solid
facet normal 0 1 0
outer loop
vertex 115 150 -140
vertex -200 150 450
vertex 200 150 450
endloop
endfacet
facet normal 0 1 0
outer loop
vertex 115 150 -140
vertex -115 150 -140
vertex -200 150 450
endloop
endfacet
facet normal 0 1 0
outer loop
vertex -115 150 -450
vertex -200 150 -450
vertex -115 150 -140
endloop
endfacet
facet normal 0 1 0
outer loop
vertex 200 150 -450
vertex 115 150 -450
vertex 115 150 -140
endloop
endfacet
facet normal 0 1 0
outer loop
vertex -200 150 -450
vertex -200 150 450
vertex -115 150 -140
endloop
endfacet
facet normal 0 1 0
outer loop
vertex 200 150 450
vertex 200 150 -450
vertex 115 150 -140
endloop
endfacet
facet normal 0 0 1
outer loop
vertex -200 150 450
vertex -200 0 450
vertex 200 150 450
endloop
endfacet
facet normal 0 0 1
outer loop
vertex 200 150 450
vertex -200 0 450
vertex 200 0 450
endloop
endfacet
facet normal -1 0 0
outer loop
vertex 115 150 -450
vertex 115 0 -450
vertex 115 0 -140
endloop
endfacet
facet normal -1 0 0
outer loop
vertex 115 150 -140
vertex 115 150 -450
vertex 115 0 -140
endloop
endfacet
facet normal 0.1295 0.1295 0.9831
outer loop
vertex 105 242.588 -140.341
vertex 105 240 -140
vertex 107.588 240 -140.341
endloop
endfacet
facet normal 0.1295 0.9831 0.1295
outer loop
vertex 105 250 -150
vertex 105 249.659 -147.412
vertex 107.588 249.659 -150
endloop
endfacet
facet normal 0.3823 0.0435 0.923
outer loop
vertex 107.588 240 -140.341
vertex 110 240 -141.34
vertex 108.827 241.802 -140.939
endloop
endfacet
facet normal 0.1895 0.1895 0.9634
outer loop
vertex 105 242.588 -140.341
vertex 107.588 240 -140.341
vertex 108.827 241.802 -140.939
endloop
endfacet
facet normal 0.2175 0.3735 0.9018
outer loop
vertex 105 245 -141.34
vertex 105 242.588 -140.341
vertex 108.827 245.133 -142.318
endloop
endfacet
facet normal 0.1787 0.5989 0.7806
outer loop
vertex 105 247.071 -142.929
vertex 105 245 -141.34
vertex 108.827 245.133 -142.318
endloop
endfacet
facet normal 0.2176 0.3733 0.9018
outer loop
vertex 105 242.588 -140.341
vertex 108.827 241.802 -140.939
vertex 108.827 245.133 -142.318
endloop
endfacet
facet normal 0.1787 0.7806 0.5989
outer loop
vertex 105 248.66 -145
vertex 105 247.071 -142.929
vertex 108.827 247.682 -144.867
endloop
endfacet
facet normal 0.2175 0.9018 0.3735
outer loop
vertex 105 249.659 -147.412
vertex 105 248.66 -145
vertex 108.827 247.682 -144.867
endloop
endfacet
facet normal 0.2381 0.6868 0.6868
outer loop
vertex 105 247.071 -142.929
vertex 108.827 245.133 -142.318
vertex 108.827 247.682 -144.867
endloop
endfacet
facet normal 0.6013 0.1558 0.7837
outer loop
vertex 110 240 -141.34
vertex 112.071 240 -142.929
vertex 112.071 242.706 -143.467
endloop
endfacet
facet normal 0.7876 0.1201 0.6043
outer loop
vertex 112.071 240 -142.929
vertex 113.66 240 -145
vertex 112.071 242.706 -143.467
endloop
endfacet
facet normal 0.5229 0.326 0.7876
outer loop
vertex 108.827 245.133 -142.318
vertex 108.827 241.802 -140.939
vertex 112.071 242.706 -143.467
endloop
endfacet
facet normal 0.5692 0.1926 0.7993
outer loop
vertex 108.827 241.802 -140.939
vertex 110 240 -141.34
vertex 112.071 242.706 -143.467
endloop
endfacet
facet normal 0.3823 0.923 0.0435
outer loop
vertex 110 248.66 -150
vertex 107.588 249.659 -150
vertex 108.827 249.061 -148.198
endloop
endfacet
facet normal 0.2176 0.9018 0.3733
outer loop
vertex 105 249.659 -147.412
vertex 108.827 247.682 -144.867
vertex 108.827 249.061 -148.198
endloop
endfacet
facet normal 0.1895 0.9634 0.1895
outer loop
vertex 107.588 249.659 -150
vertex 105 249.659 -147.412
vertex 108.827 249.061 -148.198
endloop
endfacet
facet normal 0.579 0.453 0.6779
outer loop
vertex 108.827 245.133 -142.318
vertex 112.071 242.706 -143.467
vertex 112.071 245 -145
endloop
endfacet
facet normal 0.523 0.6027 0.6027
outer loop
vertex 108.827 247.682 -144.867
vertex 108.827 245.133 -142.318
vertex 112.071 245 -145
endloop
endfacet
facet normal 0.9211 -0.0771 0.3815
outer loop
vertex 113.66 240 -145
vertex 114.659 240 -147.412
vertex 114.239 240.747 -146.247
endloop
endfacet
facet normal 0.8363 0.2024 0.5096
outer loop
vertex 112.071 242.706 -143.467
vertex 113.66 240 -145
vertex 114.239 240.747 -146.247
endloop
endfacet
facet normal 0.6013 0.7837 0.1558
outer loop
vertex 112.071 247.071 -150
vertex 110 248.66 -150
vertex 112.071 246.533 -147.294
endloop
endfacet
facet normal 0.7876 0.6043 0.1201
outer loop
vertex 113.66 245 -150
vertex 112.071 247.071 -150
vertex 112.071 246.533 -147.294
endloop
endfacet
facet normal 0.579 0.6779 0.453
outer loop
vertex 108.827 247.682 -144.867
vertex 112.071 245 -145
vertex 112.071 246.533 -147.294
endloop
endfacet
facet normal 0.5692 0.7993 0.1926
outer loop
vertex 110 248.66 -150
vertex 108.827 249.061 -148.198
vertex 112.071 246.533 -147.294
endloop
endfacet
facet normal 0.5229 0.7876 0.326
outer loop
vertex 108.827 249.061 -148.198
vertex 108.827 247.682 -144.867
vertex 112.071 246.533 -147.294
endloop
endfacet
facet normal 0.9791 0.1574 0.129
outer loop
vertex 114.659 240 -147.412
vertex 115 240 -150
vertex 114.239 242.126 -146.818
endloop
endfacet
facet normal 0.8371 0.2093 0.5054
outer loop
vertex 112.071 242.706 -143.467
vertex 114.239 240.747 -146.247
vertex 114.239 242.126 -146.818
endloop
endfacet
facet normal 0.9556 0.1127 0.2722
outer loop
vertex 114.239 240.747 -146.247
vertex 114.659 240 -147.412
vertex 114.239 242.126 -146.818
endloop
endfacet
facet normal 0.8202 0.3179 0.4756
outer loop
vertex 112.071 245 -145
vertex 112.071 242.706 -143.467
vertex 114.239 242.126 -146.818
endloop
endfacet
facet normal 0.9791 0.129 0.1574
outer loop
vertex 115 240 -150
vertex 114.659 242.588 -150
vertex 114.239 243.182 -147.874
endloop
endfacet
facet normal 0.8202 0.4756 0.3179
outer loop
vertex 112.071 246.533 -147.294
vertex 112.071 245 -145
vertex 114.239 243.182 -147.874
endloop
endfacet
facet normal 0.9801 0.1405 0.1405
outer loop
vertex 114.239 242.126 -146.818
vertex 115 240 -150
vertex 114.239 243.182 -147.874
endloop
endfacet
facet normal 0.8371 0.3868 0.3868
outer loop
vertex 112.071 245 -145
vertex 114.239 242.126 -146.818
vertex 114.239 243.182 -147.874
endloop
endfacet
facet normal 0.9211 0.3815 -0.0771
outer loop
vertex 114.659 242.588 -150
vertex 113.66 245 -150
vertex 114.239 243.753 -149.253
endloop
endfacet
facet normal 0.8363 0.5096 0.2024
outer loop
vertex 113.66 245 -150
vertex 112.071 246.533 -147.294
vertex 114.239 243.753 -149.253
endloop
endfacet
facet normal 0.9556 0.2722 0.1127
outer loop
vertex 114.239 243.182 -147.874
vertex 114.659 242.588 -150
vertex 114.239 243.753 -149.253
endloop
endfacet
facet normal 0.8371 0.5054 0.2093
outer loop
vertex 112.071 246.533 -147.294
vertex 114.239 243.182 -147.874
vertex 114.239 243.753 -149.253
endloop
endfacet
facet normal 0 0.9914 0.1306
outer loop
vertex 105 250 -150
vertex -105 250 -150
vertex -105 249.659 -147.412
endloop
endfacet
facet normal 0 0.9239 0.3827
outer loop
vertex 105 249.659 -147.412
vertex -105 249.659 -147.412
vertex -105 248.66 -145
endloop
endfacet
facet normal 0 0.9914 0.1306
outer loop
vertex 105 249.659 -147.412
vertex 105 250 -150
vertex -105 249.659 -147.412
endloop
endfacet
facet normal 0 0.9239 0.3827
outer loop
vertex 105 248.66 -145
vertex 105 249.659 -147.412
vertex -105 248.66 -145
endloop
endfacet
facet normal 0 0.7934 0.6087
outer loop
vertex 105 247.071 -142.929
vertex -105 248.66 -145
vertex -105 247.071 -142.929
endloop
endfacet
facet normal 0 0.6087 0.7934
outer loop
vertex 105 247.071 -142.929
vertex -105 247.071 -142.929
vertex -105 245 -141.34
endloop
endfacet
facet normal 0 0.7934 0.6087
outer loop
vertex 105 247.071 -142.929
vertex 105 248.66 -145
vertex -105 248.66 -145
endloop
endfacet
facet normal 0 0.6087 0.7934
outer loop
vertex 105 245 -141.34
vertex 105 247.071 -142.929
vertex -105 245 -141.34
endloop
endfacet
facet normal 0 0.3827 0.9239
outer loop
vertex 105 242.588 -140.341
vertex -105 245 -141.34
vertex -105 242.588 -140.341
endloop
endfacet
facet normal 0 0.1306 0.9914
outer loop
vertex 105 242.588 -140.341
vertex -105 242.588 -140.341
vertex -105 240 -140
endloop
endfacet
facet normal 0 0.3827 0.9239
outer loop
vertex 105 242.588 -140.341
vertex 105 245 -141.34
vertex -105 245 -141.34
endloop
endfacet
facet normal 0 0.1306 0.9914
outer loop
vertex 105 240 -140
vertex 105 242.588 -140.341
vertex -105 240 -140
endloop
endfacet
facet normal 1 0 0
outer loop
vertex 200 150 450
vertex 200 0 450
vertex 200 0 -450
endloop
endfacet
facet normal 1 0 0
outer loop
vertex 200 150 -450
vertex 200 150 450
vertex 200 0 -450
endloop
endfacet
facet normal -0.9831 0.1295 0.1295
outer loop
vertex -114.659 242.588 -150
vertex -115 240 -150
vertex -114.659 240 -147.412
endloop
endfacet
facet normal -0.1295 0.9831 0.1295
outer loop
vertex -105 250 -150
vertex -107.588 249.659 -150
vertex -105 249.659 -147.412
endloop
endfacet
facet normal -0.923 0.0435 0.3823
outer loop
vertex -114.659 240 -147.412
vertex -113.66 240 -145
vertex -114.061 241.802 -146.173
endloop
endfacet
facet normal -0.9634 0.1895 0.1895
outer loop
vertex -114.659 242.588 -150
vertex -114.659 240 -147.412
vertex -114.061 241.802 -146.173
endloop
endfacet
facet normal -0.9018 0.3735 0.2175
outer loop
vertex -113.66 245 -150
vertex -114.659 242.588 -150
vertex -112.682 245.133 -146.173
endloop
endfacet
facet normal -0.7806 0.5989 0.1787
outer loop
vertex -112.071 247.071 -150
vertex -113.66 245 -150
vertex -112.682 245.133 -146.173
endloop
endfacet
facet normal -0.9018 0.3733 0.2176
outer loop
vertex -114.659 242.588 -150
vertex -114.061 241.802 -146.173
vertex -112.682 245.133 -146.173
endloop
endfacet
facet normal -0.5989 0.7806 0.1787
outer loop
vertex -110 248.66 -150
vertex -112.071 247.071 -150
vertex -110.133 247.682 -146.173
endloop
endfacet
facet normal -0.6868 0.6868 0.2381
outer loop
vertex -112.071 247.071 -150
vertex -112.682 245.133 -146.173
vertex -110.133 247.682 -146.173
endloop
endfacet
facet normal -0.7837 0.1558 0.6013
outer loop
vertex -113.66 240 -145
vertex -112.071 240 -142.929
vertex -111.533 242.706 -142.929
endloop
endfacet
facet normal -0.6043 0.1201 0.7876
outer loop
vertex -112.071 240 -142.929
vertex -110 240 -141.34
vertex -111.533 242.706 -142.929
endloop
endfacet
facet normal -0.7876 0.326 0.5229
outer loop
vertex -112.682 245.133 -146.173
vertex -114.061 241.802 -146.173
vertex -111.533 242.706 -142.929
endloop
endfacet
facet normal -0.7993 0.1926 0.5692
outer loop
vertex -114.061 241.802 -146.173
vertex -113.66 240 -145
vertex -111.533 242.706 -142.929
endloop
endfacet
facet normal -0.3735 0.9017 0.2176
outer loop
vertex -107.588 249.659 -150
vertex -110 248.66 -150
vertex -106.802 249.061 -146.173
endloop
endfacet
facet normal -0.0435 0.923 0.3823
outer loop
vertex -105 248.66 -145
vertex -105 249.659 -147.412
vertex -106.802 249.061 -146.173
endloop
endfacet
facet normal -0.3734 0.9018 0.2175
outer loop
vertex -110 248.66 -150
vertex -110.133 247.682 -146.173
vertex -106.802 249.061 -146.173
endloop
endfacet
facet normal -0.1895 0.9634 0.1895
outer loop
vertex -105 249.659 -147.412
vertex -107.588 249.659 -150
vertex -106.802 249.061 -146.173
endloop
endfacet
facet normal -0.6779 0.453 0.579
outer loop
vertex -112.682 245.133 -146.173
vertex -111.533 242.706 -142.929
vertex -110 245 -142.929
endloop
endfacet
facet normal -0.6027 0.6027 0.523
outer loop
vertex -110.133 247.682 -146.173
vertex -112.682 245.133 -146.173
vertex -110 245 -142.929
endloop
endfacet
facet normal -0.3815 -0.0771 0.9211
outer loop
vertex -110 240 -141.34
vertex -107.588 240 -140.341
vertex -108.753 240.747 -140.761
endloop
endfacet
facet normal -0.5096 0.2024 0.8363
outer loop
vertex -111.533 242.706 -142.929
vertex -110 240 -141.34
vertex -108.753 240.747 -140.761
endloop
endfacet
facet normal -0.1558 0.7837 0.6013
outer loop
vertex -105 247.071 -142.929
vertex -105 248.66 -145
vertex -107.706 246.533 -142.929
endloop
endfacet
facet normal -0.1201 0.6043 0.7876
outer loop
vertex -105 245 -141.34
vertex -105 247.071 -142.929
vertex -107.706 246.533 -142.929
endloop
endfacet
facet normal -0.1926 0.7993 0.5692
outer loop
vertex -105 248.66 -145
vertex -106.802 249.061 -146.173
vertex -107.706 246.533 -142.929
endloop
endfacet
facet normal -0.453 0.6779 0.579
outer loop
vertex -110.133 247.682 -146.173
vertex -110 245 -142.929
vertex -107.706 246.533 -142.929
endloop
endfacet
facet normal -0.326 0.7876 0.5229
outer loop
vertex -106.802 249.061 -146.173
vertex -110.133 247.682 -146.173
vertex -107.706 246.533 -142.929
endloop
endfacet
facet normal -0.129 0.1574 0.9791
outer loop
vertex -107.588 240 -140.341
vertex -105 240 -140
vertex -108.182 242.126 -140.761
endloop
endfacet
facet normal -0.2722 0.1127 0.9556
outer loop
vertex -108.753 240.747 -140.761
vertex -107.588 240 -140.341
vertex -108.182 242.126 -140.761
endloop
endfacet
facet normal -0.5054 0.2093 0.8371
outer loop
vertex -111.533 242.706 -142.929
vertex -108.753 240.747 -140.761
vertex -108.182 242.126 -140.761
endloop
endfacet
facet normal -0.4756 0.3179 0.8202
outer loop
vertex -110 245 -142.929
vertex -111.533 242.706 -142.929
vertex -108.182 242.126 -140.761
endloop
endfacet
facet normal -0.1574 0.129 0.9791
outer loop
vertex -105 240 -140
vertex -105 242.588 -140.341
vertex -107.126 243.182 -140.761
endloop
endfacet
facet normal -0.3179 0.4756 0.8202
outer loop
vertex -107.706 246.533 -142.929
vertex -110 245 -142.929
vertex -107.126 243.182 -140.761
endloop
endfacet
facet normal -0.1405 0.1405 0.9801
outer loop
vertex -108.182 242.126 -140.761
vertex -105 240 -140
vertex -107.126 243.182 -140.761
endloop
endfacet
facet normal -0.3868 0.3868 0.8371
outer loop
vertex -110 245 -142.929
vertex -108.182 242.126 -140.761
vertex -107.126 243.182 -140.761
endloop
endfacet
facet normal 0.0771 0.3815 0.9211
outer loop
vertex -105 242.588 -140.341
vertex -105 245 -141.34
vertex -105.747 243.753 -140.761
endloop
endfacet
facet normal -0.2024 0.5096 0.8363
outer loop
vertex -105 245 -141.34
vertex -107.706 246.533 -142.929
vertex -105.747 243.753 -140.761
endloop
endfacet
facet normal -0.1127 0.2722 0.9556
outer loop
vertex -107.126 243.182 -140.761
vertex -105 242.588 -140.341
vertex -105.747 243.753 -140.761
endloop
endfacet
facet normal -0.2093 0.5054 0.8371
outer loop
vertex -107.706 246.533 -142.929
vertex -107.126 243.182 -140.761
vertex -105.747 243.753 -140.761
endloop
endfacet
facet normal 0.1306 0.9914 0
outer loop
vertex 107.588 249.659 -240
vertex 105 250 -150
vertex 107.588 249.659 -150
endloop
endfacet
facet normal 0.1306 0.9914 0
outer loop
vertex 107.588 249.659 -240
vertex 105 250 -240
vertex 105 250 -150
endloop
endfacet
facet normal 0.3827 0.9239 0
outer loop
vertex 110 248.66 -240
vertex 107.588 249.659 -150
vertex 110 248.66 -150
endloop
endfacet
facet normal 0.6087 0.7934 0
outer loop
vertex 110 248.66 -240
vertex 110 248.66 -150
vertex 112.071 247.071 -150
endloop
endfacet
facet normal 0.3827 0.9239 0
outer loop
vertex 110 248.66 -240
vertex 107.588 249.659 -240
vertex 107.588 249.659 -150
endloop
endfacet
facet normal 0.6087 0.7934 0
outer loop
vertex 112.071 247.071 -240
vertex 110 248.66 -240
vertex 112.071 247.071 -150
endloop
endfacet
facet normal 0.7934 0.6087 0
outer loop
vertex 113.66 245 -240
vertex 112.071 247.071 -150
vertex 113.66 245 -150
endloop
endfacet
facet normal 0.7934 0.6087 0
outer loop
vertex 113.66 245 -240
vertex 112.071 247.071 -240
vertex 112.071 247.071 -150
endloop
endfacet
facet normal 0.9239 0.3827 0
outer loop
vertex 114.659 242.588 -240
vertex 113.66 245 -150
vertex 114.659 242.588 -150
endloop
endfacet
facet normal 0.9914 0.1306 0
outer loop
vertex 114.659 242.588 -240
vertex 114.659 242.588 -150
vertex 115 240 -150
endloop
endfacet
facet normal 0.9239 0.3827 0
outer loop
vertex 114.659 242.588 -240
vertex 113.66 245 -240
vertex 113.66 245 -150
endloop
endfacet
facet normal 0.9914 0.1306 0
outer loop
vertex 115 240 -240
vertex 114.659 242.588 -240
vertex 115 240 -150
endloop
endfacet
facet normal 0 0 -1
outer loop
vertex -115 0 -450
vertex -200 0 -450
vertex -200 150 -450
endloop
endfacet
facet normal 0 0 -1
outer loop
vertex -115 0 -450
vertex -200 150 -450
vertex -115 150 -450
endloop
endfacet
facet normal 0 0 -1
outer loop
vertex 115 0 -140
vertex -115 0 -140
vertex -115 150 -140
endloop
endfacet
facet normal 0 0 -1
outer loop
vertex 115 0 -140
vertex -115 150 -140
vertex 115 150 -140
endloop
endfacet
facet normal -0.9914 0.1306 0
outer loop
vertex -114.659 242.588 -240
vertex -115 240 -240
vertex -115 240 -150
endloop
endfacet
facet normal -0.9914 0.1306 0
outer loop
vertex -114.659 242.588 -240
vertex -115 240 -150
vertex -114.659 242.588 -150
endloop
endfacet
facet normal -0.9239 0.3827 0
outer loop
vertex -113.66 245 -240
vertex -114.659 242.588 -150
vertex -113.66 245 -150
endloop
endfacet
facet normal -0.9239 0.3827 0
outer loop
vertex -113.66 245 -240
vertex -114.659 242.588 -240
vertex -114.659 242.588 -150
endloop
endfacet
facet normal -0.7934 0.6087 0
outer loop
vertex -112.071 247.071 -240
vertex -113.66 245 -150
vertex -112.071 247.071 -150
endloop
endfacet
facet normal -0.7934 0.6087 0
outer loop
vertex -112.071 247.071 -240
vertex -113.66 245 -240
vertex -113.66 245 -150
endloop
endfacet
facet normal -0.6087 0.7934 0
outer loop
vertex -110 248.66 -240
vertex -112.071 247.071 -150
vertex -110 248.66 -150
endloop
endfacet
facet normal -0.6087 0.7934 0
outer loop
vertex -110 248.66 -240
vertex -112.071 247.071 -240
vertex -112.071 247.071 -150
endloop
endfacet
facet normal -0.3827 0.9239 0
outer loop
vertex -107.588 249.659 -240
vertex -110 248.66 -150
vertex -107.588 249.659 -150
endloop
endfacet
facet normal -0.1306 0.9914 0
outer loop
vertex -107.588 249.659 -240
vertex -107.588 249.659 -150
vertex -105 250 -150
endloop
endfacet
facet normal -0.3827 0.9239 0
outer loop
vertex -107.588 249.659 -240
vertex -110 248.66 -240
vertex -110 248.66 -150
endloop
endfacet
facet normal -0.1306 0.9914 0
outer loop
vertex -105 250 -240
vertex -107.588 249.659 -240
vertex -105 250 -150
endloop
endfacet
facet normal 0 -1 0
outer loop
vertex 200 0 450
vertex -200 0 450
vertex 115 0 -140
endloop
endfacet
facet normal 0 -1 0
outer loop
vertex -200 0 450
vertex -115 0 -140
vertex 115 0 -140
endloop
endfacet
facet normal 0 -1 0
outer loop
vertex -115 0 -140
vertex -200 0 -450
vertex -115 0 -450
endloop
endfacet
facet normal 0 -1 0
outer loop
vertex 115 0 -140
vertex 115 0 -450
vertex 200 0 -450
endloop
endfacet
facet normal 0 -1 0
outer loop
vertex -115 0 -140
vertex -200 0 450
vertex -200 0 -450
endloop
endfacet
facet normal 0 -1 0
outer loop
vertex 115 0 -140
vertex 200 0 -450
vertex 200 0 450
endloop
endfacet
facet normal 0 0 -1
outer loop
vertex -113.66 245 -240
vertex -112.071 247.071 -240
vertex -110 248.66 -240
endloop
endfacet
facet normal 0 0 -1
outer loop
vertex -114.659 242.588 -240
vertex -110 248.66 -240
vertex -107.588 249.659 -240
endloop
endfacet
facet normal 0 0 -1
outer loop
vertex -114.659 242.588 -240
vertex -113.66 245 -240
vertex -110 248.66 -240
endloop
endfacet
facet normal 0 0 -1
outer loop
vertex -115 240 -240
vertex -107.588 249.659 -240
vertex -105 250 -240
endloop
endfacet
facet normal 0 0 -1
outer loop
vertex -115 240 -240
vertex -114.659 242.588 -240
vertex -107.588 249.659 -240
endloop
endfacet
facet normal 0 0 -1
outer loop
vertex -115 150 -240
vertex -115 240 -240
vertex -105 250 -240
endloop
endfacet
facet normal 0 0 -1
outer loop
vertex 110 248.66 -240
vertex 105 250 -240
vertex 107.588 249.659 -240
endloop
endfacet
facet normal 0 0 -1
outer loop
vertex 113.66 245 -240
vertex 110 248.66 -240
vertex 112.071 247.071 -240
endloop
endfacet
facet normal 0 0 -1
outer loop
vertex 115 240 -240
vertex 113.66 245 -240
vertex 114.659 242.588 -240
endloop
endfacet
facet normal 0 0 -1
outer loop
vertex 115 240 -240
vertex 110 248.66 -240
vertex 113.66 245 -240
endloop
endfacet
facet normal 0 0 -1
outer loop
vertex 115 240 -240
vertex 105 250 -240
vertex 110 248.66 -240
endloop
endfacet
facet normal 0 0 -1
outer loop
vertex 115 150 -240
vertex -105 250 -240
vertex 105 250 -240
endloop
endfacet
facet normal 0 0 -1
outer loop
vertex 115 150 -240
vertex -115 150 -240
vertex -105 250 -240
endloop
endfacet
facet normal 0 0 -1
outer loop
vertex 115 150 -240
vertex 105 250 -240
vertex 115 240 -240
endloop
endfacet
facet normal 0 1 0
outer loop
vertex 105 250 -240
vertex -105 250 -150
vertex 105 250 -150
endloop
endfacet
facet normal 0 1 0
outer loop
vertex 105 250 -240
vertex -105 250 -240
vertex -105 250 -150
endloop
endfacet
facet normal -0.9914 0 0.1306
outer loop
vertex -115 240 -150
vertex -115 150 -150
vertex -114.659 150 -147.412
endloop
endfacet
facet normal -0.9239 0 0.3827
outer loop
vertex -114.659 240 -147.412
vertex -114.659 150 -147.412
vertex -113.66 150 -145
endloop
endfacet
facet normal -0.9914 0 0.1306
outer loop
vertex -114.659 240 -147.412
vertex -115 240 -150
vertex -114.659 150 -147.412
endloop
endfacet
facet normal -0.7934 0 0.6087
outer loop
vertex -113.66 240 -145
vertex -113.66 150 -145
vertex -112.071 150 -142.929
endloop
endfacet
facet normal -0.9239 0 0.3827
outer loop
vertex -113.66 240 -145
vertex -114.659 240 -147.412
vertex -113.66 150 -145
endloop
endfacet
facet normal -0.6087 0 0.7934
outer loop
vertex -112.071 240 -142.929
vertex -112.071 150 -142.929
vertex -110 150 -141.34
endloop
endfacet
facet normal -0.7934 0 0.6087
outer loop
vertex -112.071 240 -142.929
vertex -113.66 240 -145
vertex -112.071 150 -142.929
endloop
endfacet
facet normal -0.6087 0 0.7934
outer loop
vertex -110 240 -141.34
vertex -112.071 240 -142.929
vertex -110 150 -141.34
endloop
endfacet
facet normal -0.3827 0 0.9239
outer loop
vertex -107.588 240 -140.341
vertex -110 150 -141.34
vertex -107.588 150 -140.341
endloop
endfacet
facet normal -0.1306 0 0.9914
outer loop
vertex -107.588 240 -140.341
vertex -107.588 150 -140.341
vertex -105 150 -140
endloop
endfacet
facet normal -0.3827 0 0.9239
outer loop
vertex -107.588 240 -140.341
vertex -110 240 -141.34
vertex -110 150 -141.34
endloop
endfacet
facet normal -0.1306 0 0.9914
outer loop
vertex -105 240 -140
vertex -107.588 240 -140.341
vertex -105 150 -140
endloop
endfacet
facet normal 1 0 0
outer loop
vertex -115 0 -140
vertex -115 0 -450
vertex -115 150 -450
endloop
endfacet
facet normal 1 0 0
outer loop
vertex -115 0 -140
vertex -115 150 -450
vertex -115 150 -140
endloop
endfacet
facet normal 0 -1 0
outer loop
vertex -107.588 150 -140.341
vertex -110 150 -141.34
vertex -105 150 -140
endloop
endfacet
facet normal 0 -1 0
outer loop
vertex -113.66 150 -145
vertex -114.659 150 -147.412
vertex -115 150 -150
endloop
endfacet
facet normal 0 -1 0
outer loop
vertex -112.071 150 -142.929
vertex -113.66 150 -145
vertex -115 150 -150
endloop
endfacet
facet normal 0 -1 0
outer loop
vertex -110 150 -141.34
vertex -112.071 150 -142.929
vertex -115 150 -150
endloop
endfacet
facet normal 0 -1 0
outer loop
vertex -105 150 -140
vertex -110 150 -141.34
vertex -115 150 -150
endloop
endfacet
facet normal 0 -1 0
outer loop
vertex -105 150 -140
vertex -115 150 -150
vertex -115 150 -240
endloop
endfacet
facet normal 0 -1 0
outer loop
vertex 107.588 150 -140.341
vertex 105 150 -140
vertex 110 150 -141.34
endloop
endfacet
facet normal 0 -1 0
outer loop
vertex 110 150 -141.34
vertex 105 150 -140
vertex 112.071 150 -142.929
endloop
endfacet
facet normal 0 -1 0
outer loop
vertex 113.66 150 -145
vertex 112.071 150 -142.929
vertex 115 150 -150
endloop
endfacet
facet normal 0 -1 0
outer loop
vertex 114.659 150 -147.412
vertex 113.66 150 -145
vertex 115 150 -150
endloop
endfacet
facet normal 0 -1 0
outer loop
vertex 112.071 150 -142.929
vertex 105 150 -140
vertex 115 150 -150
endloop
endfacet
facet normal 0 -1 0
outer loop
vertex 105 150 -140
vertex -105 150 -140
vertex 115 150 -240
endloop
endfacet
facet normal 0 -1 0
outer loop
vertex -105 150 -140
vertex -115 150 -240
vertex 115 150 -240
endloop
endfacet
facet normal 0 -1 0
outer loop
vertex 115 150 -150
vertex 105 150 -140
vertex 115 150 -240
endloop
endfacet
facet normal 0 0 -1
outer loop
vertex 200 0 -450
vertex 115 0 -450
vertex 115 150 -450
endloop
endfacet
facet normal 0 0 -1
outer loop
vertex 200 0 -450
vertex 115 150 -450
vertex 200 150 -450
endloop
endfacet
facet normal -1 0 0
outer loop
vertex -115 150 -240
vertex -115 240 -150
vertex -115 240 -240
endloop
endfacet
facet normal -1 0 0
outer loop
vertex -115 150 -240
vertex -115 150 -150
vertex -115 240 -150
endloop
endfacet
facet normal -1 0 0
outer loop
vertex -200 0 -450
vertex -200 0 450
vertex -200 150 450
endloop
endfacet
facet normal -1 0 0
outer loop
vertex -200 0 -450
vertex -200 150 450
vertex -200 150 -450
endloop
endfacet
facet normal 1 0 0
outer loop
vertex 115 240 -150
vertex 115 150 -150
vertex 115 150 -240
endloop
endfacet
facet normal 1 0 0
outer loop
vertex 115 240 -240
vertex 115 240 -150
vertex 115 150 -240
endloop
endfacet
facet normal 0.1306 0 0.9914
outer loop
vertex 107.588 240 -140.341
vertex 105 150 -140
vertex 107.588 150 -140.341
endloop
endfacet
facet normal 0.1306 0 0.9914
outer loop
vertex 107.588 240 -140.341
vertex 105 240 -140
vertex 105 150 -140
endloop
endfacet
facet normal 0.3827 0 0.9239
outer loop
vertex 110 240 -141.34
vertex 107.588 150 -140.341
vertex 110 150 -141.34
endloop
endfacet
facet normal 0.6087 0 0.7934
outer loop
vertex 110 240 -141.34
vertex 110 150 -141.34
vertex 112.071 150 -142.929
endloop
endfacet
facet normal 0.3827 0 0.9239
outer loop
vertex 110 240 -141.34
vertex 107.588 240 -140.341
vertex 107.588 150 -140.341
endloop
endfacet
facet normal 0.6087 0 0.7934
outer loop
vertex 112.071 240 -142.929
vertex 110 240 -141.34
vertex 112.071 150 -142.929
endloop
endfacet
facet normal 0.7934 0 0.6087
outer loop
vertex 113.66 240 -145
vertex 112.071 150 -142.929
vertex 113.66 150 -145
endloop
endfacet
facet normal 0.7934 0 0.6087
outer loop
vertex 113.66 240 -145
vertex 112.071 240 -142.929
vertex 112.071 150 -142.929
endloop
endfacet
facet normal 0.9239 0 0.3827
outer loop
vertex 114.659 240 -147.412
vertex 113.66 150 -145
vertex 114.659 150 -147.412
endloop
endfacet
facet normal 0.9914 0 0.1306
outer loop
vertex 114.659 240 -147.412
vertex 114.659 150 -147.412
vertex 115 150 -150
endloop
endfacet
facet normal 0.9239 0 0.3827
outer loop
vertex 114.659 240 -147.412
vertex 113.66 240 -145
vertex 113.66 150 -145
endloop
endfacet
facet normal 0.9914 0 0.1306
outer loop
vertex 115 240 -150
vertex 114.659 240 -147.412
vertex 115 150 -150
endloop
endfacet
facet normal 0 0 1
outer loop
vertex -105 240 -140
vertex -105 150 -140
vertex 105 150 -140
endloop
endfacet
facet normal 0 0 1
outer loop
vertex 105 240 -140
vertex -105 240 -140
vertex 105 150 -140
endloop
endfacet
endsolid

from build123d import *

# Parameters (mm, degrees)
CROQUIS2_W              = 400
CROQUIS2_H              = 900
SALIENTE_EXTRUIR1_DEPTH = 150
CROQUIS3_W              = 230
CROQUIS3_H              = 620
CORTAR_EXTRUIR1_DEPTH   = 150
CROQUIS9_W              = 230
CROQUIS9_H              = 100
SALIENTE_EXTRUIR6_DEPTH = 100
REDONDEO1_R             = 10
REDONDEO2_R             = 10
REDONDEO3_R             = 10


with BuildPart() as part:
    # Croquis2 → Saliente-Extruir1 (new body)
    with BuildSketch(Plane(origin=(0, 0, 0), x_dir=(1, 0, 0), z_dir=(0, 1, 0))):
        Rectangle(CROQUIS2_W, CROQUIS2_H)
    extrude(amount=SALIENTE_EXTRUIR1_DEPTH)

    # Croquis3 → Cortar-Extruir1 (cut)
    with BuildSketch(Plane.XZ):
        with Locations((0, -450)):
            Rectangle(CROQUIS3_W, CROQUIS3_H)
    extrude(amount=-CORTAR_EXTRUIR1_DEPTH, mode=Mode.SUBTRACT)


with BuildPart() as body_2:
    # Croquis9 → Saliente-Extruir6 (new body)
    with BuildSketch(Plane(origin=(0, 150, 0), x_dir=(1, 0, 0), z_dir=(0, 1, 0))):
        with Locations((0, 190)):
            Rectangle(CROQUIS9_W, CROQUIS9_H)
    extrude(amount=SALIENTE_EXTRUIR6_DEPTH)

    # Redondeo1
    redondeo1_edges = [body_2.edges().sort_by_distance(p)[0] for p in [
        (-115, 250, -190),
    ]]
    fillet(redondeo1_edges, radius=REDONDEO1_R)

    # Redondeo2
    redondeo2_edges = [body_2.edges().sort_by_distance(p)[0] for p in [
        (-115, 195, -140),
        (5, 250, -140),
    ]]
    fillet(redondeo2_edges, radius=REDONDEO2_R)

    # Redondeo3
    redondeo3_edges = [body_2.edges().sort_by_distance(p)[0] for p in [
        (115, 195, -140),
        (115, 250, -195),
    ]]
    fillet(redondeo3_edges, radius=REDONDEO3_R)


solid = Compound([part.part, body_2.part])
